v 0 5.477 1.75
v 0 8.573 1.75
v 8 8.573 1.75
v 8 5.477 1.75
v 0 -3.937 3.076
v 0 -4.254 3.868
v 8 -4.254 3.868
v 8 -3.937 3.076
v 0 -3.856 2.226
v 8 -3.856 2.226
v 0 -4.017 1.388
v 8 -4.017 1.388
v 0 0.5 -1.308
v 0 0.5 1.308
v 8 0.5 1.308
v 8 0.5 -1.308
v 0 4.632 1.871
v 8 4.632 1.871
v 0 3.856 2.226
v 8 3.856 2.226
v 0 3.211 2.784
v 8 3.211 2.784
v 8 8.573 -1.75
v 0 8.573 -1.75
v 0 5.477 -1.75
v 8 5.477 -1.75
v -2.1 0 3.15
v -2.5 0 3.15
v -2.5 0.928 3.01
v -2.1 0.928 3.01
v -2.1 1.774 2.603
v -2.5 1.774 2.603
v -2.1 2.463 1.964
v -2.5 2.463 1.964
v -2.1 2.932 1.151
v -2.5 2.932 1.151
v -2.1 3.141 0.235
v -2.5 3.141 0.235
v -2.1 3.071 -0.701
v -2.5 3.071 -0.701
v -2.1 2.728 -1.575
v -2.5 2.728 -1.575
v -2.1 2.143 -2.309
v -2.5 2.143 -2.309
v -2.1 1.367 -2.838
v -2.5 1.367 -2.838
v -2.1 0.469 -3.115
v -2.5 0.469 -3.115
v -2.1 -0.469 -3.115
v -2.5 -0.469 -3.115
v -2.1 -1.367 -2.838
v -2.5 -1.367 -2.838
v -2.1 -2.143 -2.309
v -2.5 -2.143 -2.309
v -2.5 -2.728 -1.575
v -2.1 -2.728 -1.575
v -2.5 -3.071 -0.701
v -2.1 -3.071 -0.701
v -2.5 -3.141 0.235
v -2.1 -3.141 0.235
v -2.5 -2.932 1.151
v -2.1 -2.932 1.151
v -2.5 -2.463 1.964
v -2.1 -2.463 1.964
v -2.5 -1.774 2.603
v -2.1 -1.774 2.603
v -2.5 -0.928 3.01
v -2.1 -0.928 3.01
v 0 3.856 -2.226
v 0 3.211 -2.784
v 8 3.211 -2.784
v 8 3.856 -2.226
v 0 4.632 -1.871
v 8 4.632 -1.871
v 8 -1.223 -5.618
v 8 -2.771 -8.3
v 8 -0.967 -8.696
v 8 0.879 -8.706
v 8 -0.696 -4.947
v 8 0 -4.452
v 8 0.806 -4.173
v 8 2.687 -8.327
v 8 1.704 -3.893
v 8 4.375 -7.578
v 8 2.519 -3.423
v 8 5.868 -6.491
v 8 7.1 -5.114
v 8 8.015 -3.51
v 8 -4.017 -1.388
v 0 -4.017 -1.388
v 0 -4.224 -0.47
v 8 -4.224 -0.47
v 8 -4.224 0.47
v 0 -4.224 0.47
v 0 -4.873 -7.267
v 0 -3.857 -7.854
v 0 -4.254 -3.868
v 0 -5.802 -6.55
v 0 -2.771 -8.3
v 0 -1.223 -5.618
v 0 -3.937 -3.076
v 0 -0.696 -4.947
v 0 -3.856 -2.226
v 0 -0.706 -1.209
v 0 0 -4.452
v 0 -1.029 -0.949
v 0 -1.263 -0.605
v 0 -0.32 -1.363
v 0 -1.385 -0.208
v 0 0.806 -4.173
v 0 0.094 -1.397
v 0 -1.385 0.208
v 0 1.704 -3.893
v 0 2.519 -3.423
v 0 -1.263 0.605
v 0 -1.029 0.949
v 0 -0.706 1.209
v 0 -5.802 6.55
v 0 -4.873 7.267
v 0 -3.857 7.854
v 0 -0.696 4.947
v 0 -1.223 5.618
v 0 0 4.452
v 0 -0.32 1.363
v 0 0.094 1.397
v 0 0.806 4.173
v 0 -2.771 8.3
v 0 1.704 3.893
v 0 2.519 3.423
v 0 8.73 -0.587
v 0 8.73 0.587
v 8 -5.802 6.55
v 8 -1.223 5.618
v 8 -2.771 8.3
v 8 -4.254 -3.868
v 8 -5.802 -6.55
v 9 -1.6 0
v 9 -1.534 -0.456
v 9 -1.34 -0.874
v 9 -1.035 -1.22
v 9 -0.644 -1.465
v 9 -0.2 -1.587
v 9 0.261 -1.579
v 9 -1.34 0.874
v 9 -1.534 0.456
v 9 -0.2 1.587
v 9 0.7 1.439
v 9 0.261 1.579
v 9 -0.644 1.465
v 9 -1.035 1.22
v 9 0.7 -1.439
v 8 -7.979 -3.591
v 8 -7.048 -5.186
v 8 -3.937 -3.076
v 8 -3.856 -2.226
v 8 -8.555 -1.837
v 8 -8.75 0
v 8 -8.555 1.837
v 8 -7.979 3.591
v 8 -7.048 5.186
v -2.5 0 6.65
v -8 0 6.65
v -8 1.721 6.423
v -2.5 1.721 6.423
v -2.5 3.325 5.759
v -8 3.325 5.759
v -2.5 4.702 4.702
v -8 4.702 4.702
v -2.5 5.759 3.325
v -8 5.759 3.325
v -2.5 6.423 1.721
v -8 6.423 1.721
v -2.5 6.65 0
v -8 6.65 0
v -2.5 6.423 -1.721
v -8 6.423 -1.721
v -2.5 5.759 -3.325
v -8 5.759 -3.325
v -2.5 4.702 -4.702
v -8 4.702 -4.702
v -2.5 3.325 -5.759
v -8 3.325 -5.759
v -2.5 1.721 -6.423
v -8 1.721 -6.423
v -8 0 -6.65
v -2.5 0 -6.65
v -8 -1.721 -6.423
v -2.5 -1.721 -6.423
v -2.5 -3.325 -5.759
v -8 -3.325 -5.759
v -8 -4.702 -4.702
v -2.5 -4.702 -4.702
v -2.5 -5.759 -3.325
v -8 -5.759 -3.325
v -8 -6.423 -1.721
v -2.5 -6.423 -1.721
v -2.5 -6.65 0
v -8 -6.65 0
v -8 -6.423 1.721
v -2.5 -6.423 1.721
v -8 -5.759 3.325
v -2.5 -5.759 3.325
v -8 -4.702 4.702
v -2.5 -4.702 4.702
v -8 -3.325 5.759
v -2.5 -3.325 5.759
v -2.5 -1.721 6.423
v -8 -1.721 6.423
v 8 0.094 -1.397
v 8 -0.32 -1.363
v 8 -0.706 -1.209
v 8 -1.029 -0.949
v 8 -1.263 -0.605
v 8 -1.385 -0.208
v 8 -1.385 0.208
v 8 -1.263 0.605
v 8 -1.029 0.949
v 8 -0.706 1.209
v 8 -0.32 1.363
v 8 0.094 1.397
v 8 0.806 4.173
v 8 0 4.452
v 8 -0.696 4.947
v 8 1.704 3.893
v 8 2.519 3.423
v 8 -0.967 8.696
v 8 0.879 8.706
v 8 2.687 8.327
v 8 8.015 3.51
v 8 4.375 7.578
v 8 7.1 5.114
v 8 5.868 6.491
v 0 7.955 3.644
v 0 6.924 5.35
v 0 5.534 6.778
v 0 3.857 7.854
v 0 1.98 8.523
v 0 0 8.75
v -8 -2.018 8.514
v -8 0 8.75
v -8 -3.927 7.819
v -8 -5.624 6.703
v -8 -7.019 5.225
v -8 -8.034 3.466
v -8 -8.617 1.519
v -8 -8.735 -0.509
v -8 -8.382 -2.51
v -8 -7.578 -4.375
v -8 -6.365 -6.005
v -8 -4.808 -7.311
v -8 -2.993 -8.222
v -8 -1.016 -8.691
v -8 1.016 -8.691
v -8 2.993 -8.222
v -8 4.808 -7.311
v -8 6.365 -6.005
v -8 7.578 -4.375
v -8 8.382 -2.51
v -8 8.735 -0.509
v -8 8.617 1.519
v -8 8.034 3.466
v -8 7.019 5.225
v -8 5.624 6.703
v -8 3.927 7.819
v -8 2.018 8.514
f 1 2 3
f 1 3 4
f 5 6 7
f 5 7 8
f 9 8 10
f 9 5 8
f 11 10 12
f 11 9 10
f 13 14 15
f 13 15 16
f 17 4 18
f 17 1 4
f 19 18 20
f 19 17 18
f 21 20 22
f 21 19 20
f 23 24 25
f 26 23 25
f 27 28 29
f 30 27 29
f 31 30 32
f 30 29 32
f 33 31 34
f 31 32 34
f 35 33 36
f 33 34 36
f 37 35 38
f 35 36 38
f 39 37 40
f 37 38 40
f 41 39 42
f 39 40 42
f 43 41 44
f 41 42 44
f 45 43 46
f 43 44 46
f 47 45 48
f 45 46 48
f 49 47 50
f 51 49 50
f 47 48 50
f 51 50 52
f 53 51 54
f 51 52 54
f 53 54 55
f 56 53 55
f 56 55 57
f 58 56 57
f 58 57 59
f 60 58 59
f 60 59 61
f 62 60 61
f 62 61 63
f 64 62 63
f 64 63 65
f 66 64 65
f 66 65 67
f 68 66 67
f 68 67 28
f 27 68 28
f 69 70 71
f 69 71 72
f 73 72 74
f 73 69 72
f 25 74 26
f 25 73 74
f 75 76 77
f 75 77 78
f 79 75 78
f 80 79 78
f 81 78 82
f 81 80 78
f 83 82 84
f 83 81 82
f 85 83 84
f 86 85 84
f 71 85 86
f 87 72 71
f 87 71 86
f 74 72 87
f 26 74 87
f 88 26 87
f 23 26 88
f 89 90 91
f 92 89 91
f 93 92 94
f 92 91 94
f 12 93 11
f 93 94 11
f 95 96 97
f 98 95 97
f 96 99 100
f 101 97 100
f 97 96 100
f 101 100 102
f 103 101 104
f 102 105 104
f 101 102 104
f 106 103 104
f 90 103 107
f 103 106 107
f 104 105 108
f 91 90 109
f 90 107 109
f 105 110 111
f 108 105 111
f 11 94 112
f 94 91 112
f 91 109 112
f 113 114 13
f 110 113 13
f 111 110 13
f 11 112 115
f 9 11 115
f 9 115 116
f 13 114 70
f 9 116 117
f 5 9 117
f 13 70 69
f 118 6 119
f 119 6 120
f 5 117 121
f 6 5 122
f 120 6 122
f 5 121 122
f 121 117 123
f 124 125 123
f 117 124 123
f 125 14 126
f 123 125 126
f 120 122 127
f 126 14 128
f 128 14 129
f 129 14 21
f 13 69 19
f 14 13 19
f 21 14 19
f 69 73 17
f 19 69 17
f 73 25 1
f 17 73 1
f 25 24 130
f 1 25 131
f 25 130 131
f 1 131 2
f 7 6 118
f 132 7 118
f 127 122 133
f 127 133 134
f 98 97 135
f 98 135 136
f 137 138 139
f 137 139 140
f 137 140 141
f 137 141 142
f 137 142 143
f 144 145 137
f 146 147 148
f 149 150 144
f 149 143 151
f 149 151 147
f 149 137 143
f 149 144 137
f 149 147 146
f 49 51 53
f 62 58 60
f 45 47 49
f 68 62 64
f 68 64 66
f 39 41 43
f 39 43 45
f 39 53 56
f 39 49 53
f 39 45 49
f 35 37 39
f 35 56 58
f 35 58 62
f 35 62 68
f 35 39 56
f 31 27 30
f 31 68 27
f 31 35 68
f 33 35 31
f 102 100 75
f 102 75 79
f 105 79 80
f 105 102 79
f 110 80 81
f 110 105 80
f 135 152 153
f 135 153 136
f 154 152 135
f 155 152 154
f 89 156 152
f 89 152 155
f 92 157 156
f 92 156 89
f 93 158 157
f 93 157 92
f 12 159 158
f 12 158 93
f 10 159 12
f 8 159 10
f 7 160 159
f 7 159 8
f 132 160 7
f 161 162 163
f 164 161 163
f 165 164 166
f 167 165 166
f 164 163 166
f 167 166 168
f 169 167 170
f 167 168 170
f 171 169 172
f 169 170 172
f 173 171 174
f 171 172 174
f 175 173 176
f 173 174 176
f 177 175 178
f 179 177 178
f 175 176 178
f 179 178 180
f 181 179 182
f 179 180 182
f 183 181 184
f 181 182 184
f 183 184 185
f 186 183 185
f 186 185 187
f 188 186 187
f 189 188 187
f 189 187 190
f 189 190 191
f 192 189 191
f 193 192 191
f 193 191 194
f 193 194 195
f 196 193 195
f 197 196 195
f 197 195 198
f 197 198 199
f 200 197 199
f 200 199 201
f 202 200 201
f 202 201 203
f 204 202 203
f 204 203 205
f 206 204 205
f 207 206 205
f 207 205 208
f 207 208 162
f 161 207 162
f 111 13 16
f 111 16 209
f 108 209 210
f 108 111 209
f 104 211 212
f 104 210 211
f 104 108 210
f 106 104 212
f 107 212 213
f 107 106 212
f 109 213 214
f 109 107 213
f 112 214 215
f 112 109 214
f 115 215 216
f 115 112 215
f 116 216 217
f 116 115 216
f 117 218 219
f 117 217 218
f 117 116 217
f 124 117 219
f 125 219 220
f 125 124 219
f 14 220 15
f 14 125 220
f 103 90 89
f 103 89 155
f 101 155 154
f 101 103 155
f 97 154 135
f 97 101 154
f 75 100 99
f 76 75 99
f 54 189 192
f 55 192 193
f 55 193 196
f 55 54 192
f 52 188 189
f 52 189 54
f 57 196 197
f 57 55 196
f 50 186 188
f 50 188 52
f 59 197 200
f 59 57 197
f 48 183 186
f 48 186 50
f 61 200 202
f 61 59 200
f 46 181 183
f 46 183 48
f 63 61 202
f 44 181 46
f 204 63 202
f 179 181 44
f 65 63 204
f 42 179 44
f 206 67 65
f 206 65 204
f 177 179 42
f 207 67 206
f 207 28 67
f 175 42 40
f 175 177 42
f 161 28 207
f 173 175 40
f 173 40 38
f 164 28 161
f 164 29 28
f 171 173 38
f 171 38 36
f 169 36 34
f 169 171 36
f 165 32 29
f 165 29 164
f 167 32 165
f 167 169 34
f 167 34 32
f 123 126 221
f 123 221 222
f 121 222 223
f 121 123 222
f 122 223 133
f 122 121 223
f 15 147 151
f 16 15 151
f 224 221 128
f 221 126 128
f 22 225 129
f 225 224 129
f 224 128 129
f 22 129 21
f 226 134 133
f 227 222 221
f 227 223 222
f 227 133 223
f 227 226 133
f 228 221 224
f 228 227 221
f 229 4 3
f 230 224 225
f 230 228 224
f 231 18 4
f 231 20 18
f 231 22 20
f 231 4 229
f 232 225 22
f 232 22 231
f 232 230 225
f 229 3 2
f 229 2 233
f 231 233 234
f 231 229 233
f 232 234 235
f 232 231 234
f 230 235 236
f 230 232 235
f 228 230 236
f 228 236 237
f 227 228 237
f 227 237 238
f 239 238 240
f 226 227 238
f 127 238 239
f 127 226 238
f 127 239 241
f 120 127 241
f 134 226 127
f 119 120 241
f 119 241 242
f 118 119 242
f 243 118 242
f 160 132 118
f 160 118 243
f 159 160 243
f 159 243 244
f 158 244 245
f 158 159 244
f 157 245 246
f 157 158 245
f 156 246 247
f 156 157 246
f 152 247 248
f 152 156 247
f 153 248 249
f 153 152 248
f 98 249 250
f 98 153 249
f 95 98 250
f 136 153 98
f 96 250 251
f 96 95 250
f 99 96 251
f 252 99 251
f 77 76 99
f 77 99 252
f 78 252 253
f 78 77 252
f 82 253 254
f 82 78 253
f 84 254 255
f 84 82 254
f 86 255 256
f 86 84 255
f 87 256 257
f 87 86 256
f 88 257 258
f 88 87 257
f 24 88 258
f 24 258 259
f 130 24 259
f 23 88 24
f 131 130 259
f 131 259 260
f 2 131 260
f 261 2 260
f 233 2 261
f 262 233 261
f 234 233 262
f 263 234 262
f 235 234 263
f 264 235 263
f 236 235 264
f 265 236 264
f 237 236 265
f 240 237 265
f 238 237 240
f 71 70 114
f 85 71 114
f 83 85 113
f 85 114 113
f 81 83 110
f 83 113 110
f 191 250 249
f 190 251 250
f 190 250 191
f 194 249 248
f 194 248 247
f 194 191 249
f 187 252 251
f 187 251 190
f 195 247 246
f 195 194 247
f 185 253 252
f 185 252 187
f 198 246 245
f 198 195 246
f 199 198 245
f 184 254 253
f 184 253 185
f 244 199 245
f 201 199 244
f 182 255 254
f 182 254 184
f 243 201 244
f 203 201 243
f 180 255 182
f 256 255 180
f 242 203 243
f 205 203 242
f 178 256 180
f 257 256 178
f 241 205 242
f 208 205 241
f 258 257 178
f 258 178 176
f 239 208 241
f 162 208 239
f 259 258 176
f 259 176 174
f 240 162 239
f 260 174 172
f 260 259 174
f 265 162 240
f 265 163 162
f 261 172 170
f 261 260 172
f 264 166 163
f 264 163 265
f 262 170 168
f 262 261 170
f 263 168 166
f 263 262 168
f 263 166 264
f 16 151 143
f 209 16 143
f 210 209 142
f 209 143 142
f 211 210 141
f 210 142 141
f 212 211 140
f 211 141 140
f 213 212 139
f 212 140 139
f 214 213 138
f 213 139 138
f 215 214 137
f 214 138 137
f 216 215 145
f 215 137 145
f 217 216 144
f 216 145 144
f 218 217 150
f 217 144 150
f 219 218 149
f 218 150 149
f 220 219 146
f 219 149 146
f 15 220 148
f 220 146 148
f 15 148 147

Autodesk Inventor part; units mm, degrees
ref_plane "YZ Plane" through (0, 0, 0) normal (1, 0, 0) x (0, 1, 0)
ref_plane "XZ Plane" through (0, 0, 0) normal (0, 1, 0) x (-1, 0, 0)
sketch "Sketch1" plane through (0, 0, 0) normal (1, 0, 0) x (0, 1, 0)
  circle A0 centre (0, 0) radius 1.4
  line L0 (0.5, 1.30767) -> (0.5, -1.30767)
  dimension "d1" = 2.8
  dimension "d2" = 0.5
extrude "Extrusion1" add sketch "Sketch1" along normal blind 8 contours L0 A0 picked at (-0.62029, 0.295862)
sketch "Sketch2" plane through (0, 0, 0) normal (-1, 0, 0) x (0, 0, 1)
  circle A0 centre (0, 0) radius 8.75
  arc A1 (-1.30767, 0.5) -> (1.30767, 0.5) centre (0, 0) ccw
  dimension "d5" = 17.5
extrude "Extrusion2" add sketch "Sketch2" along normal blind 8
sketch "Sketch3" plane through (0, 0, 0) normal (1, 0, 0) x (0, 1, 0)
  circle A0 centre (0, 0) radius 4.25
  line L0 (4, 1.75) -> (8.573214, 1.75)
  line L1 (4, -1.75) -> (8.573214, -1.75)
  line L2 (-10.5, 0) -> (10.5, 0)
  circle A1 centre (0, 0) radius 8.75
  line L3 (0.5, -1.30767) -> (0.5, 1.30767)
  arc A2 (0.5, 1.30767) -> (0.5, -1.30767) centre (0, 0) ccw
  arc A3 (3.820225, 1.86236) -> (4, 1.75) centre (4, 1.95) ccw
  arc A4 (4, -1.75) -> (3.820225, -1.86236) centre (4, -1.95) ccw
  line L4 (-3.515544, 2.589102) -> (-5.802152, 6.549621)
  line L5 (-0.484456, 4.339102) -> (-2.771063, 8.299621)
  arc A5 (-0.484456, 4.339102) -> (-0.297262, 4.239591) centre (-0.31125, 4.439102) ccw
  arc A6 (-3.522963, 2.377232) -> (-3.515544, 2.589102) centre (-3.68875, 2.489102) ccw
  line L6 (-0.484456, -4.339102) -> (-2.771063, -8.299621)
  line L7 (-3.515544, -2.589102) -> (-5.802152, -6.549621)
  arc A7 (-3.515544, -2.589102) -> (-3.522963, -2.377232) centre (-3.68875, -2.489102) ccw
  arc A8 (-0.297262, -4.239591) -> (-0.484456, -4.339102) centre (-0.31125, -4.439102) ccw
  arc A9 (0.5, 1.30767) -> (0.5, -1.30767) centre (0, 0) ccw
  circle A10 centre (0, 0) radius 5
  line L8 (4, 1.75) -> (3.872983, 1.75)
  line L9 (4, -1.75) -> (3.840573, -1.75)
  line L10 (-0.484456, -4.339102) -> (-0.420947, -4.229102)
  line L11 (-3.515544, -2.589102) -> (-3.452036, -2.479102)
  line L12 (-3.515544, 2.589102) -> (-3.452036, 2.479102)
  line L13 (-0.484456, 4.339102) -> (-0.420947, 4.229102)
  point P0 (-3.522963, -2.377232)
  point P1 (-4.25, 0)
  point P2 (-8.75, 0)
  point P3 (-5.802152, -6.549621)
  point P4 (-0.297262, -4.239591)
  point P5 (-2.771063, -8.299621)
  point P6 (8.573214, -1.75)
  point P7 (-0.297262, 4.239591)
  point P8 (-3.522963, 2.377232)
  point P9 (-5.802152, 6.549621)
  point P10 (3.872983, -1.75)
  dimension "d8" = 8.5
  dimension "d9" = 3.5
  dimension "d10" = 4
  dimension "d14" = 360
  dimension "d22" = 10
extrude "Extrusion3" add sketch "Sketch3" along normal blind 8 contours A0 A3 L8 | L9 A4 A0 | A0 A5 L5 A10 L0 A3 | A4 L1 A10 L6 A8 A0 | A10 L5 A1 L0 | L1 A1 L6 A10 | A0 L13 A5 | A8 L10 A0 | L2 A10 L4 A6 A0 | A0 A7 L7 A10 L2 | A10 L2 A1 L4 | L7 A1 L2 A10 | A6 L12 A0 | A0 L11 A7
sketch "Sketch4" plane through (-8, 0, 0) normal (-1, 0, 0) x (0, 0, 1)
  circle A0 centre (0, 0) radius 6.65
  dimension "d19" = 13.3
extrude "Extrusion4" cut sketch "Sketch4" against normal blind 5.5
fillet "Fillet1" radius 3 6 edges at (4, 3.873, 1.75) (4, -0.4209, 4.2291) (4, 3.873, -1.75) (4, -0.4209, -4.2291) (4, -3.452, -2.4791) (4, -3.452, 2.4791)
sketch "Sketch5" plane through (-2.5, 0, 0) normal (-1, 0, 0) x (0, 0, 1)
  circle A0 centre (0, 0) radius 2.5
  dimension "d24" = 5
extrude "Extrusion5" [suppressed]
sketch "Sketch6" plane through (-22, 0, 0) normal (-1, 0, 0) x (0, 0, 1)
  arc A0 (-1.2, 0.5) -> (1.2, 0.5) centre (0, 0) ccw projected
  circle A1 centre (0, 0) radius 2.5 projected
ref_plane "Work Plane1" through (9, 0, 0) normal (1, 0, 0) x (0, 0, -1)
sketch "Sketch7" plane through (9, 0, 0) normal (1, 0, 0) x (0, 0, -1)
  arc A0 (-1.30767, 0.5) -> (1.30767, 0.5) centre (0, 0) ccw
  line L0 (1.30767, 0.5) -> (-1.30767, 0.5)
  circle A1 centre (0, 0) radius 1.6
  line L1 (-1.438749, 0.7) -> (1.438749, 0.7)
  dimension "d28" = 3.2
  dimension "d30" = 0.5
  dimension "d31" = 0.7
sketch "Sketch8" plane through (8, 0, 0) normal (1, 0, 0) x (0, 0, -1)
  arc A0 (-1.30767, 0.5) -> (1.30767, 0.5) centre (0, 0) ccw
  line L0 (1.30767, 0.5) -> (-1.30767, 0.5)
sketch "Sketch7 outline for Loft1" plane through (9, 0, 0) normal (1, 0, 0) x (0, 0, -1)
  line L0 (1.438749, 0.7) -> (-1.438749, 0.7)
  arc A0 (-1.438749, 0.7) -> (1.438749, 0.7) centre (0, 0) ccw
loft "Loft1" add profiles "Sketch7 outline for Loft1" section 1 edges at (8, -1.4, 0) (8, 0.5, 0)
sketch "Sketch9" plane through (-2.5, 0, 0) normal (-1, 0, 0) x (0, 0, 1)
  circle A0 centre (0, 0) radius 3.15
  dimension "d36" = 6.3
extrude "Extrusion6" cut sketch "Sketch9" against normal blind 0.4
properties part number "front wheel mount"
